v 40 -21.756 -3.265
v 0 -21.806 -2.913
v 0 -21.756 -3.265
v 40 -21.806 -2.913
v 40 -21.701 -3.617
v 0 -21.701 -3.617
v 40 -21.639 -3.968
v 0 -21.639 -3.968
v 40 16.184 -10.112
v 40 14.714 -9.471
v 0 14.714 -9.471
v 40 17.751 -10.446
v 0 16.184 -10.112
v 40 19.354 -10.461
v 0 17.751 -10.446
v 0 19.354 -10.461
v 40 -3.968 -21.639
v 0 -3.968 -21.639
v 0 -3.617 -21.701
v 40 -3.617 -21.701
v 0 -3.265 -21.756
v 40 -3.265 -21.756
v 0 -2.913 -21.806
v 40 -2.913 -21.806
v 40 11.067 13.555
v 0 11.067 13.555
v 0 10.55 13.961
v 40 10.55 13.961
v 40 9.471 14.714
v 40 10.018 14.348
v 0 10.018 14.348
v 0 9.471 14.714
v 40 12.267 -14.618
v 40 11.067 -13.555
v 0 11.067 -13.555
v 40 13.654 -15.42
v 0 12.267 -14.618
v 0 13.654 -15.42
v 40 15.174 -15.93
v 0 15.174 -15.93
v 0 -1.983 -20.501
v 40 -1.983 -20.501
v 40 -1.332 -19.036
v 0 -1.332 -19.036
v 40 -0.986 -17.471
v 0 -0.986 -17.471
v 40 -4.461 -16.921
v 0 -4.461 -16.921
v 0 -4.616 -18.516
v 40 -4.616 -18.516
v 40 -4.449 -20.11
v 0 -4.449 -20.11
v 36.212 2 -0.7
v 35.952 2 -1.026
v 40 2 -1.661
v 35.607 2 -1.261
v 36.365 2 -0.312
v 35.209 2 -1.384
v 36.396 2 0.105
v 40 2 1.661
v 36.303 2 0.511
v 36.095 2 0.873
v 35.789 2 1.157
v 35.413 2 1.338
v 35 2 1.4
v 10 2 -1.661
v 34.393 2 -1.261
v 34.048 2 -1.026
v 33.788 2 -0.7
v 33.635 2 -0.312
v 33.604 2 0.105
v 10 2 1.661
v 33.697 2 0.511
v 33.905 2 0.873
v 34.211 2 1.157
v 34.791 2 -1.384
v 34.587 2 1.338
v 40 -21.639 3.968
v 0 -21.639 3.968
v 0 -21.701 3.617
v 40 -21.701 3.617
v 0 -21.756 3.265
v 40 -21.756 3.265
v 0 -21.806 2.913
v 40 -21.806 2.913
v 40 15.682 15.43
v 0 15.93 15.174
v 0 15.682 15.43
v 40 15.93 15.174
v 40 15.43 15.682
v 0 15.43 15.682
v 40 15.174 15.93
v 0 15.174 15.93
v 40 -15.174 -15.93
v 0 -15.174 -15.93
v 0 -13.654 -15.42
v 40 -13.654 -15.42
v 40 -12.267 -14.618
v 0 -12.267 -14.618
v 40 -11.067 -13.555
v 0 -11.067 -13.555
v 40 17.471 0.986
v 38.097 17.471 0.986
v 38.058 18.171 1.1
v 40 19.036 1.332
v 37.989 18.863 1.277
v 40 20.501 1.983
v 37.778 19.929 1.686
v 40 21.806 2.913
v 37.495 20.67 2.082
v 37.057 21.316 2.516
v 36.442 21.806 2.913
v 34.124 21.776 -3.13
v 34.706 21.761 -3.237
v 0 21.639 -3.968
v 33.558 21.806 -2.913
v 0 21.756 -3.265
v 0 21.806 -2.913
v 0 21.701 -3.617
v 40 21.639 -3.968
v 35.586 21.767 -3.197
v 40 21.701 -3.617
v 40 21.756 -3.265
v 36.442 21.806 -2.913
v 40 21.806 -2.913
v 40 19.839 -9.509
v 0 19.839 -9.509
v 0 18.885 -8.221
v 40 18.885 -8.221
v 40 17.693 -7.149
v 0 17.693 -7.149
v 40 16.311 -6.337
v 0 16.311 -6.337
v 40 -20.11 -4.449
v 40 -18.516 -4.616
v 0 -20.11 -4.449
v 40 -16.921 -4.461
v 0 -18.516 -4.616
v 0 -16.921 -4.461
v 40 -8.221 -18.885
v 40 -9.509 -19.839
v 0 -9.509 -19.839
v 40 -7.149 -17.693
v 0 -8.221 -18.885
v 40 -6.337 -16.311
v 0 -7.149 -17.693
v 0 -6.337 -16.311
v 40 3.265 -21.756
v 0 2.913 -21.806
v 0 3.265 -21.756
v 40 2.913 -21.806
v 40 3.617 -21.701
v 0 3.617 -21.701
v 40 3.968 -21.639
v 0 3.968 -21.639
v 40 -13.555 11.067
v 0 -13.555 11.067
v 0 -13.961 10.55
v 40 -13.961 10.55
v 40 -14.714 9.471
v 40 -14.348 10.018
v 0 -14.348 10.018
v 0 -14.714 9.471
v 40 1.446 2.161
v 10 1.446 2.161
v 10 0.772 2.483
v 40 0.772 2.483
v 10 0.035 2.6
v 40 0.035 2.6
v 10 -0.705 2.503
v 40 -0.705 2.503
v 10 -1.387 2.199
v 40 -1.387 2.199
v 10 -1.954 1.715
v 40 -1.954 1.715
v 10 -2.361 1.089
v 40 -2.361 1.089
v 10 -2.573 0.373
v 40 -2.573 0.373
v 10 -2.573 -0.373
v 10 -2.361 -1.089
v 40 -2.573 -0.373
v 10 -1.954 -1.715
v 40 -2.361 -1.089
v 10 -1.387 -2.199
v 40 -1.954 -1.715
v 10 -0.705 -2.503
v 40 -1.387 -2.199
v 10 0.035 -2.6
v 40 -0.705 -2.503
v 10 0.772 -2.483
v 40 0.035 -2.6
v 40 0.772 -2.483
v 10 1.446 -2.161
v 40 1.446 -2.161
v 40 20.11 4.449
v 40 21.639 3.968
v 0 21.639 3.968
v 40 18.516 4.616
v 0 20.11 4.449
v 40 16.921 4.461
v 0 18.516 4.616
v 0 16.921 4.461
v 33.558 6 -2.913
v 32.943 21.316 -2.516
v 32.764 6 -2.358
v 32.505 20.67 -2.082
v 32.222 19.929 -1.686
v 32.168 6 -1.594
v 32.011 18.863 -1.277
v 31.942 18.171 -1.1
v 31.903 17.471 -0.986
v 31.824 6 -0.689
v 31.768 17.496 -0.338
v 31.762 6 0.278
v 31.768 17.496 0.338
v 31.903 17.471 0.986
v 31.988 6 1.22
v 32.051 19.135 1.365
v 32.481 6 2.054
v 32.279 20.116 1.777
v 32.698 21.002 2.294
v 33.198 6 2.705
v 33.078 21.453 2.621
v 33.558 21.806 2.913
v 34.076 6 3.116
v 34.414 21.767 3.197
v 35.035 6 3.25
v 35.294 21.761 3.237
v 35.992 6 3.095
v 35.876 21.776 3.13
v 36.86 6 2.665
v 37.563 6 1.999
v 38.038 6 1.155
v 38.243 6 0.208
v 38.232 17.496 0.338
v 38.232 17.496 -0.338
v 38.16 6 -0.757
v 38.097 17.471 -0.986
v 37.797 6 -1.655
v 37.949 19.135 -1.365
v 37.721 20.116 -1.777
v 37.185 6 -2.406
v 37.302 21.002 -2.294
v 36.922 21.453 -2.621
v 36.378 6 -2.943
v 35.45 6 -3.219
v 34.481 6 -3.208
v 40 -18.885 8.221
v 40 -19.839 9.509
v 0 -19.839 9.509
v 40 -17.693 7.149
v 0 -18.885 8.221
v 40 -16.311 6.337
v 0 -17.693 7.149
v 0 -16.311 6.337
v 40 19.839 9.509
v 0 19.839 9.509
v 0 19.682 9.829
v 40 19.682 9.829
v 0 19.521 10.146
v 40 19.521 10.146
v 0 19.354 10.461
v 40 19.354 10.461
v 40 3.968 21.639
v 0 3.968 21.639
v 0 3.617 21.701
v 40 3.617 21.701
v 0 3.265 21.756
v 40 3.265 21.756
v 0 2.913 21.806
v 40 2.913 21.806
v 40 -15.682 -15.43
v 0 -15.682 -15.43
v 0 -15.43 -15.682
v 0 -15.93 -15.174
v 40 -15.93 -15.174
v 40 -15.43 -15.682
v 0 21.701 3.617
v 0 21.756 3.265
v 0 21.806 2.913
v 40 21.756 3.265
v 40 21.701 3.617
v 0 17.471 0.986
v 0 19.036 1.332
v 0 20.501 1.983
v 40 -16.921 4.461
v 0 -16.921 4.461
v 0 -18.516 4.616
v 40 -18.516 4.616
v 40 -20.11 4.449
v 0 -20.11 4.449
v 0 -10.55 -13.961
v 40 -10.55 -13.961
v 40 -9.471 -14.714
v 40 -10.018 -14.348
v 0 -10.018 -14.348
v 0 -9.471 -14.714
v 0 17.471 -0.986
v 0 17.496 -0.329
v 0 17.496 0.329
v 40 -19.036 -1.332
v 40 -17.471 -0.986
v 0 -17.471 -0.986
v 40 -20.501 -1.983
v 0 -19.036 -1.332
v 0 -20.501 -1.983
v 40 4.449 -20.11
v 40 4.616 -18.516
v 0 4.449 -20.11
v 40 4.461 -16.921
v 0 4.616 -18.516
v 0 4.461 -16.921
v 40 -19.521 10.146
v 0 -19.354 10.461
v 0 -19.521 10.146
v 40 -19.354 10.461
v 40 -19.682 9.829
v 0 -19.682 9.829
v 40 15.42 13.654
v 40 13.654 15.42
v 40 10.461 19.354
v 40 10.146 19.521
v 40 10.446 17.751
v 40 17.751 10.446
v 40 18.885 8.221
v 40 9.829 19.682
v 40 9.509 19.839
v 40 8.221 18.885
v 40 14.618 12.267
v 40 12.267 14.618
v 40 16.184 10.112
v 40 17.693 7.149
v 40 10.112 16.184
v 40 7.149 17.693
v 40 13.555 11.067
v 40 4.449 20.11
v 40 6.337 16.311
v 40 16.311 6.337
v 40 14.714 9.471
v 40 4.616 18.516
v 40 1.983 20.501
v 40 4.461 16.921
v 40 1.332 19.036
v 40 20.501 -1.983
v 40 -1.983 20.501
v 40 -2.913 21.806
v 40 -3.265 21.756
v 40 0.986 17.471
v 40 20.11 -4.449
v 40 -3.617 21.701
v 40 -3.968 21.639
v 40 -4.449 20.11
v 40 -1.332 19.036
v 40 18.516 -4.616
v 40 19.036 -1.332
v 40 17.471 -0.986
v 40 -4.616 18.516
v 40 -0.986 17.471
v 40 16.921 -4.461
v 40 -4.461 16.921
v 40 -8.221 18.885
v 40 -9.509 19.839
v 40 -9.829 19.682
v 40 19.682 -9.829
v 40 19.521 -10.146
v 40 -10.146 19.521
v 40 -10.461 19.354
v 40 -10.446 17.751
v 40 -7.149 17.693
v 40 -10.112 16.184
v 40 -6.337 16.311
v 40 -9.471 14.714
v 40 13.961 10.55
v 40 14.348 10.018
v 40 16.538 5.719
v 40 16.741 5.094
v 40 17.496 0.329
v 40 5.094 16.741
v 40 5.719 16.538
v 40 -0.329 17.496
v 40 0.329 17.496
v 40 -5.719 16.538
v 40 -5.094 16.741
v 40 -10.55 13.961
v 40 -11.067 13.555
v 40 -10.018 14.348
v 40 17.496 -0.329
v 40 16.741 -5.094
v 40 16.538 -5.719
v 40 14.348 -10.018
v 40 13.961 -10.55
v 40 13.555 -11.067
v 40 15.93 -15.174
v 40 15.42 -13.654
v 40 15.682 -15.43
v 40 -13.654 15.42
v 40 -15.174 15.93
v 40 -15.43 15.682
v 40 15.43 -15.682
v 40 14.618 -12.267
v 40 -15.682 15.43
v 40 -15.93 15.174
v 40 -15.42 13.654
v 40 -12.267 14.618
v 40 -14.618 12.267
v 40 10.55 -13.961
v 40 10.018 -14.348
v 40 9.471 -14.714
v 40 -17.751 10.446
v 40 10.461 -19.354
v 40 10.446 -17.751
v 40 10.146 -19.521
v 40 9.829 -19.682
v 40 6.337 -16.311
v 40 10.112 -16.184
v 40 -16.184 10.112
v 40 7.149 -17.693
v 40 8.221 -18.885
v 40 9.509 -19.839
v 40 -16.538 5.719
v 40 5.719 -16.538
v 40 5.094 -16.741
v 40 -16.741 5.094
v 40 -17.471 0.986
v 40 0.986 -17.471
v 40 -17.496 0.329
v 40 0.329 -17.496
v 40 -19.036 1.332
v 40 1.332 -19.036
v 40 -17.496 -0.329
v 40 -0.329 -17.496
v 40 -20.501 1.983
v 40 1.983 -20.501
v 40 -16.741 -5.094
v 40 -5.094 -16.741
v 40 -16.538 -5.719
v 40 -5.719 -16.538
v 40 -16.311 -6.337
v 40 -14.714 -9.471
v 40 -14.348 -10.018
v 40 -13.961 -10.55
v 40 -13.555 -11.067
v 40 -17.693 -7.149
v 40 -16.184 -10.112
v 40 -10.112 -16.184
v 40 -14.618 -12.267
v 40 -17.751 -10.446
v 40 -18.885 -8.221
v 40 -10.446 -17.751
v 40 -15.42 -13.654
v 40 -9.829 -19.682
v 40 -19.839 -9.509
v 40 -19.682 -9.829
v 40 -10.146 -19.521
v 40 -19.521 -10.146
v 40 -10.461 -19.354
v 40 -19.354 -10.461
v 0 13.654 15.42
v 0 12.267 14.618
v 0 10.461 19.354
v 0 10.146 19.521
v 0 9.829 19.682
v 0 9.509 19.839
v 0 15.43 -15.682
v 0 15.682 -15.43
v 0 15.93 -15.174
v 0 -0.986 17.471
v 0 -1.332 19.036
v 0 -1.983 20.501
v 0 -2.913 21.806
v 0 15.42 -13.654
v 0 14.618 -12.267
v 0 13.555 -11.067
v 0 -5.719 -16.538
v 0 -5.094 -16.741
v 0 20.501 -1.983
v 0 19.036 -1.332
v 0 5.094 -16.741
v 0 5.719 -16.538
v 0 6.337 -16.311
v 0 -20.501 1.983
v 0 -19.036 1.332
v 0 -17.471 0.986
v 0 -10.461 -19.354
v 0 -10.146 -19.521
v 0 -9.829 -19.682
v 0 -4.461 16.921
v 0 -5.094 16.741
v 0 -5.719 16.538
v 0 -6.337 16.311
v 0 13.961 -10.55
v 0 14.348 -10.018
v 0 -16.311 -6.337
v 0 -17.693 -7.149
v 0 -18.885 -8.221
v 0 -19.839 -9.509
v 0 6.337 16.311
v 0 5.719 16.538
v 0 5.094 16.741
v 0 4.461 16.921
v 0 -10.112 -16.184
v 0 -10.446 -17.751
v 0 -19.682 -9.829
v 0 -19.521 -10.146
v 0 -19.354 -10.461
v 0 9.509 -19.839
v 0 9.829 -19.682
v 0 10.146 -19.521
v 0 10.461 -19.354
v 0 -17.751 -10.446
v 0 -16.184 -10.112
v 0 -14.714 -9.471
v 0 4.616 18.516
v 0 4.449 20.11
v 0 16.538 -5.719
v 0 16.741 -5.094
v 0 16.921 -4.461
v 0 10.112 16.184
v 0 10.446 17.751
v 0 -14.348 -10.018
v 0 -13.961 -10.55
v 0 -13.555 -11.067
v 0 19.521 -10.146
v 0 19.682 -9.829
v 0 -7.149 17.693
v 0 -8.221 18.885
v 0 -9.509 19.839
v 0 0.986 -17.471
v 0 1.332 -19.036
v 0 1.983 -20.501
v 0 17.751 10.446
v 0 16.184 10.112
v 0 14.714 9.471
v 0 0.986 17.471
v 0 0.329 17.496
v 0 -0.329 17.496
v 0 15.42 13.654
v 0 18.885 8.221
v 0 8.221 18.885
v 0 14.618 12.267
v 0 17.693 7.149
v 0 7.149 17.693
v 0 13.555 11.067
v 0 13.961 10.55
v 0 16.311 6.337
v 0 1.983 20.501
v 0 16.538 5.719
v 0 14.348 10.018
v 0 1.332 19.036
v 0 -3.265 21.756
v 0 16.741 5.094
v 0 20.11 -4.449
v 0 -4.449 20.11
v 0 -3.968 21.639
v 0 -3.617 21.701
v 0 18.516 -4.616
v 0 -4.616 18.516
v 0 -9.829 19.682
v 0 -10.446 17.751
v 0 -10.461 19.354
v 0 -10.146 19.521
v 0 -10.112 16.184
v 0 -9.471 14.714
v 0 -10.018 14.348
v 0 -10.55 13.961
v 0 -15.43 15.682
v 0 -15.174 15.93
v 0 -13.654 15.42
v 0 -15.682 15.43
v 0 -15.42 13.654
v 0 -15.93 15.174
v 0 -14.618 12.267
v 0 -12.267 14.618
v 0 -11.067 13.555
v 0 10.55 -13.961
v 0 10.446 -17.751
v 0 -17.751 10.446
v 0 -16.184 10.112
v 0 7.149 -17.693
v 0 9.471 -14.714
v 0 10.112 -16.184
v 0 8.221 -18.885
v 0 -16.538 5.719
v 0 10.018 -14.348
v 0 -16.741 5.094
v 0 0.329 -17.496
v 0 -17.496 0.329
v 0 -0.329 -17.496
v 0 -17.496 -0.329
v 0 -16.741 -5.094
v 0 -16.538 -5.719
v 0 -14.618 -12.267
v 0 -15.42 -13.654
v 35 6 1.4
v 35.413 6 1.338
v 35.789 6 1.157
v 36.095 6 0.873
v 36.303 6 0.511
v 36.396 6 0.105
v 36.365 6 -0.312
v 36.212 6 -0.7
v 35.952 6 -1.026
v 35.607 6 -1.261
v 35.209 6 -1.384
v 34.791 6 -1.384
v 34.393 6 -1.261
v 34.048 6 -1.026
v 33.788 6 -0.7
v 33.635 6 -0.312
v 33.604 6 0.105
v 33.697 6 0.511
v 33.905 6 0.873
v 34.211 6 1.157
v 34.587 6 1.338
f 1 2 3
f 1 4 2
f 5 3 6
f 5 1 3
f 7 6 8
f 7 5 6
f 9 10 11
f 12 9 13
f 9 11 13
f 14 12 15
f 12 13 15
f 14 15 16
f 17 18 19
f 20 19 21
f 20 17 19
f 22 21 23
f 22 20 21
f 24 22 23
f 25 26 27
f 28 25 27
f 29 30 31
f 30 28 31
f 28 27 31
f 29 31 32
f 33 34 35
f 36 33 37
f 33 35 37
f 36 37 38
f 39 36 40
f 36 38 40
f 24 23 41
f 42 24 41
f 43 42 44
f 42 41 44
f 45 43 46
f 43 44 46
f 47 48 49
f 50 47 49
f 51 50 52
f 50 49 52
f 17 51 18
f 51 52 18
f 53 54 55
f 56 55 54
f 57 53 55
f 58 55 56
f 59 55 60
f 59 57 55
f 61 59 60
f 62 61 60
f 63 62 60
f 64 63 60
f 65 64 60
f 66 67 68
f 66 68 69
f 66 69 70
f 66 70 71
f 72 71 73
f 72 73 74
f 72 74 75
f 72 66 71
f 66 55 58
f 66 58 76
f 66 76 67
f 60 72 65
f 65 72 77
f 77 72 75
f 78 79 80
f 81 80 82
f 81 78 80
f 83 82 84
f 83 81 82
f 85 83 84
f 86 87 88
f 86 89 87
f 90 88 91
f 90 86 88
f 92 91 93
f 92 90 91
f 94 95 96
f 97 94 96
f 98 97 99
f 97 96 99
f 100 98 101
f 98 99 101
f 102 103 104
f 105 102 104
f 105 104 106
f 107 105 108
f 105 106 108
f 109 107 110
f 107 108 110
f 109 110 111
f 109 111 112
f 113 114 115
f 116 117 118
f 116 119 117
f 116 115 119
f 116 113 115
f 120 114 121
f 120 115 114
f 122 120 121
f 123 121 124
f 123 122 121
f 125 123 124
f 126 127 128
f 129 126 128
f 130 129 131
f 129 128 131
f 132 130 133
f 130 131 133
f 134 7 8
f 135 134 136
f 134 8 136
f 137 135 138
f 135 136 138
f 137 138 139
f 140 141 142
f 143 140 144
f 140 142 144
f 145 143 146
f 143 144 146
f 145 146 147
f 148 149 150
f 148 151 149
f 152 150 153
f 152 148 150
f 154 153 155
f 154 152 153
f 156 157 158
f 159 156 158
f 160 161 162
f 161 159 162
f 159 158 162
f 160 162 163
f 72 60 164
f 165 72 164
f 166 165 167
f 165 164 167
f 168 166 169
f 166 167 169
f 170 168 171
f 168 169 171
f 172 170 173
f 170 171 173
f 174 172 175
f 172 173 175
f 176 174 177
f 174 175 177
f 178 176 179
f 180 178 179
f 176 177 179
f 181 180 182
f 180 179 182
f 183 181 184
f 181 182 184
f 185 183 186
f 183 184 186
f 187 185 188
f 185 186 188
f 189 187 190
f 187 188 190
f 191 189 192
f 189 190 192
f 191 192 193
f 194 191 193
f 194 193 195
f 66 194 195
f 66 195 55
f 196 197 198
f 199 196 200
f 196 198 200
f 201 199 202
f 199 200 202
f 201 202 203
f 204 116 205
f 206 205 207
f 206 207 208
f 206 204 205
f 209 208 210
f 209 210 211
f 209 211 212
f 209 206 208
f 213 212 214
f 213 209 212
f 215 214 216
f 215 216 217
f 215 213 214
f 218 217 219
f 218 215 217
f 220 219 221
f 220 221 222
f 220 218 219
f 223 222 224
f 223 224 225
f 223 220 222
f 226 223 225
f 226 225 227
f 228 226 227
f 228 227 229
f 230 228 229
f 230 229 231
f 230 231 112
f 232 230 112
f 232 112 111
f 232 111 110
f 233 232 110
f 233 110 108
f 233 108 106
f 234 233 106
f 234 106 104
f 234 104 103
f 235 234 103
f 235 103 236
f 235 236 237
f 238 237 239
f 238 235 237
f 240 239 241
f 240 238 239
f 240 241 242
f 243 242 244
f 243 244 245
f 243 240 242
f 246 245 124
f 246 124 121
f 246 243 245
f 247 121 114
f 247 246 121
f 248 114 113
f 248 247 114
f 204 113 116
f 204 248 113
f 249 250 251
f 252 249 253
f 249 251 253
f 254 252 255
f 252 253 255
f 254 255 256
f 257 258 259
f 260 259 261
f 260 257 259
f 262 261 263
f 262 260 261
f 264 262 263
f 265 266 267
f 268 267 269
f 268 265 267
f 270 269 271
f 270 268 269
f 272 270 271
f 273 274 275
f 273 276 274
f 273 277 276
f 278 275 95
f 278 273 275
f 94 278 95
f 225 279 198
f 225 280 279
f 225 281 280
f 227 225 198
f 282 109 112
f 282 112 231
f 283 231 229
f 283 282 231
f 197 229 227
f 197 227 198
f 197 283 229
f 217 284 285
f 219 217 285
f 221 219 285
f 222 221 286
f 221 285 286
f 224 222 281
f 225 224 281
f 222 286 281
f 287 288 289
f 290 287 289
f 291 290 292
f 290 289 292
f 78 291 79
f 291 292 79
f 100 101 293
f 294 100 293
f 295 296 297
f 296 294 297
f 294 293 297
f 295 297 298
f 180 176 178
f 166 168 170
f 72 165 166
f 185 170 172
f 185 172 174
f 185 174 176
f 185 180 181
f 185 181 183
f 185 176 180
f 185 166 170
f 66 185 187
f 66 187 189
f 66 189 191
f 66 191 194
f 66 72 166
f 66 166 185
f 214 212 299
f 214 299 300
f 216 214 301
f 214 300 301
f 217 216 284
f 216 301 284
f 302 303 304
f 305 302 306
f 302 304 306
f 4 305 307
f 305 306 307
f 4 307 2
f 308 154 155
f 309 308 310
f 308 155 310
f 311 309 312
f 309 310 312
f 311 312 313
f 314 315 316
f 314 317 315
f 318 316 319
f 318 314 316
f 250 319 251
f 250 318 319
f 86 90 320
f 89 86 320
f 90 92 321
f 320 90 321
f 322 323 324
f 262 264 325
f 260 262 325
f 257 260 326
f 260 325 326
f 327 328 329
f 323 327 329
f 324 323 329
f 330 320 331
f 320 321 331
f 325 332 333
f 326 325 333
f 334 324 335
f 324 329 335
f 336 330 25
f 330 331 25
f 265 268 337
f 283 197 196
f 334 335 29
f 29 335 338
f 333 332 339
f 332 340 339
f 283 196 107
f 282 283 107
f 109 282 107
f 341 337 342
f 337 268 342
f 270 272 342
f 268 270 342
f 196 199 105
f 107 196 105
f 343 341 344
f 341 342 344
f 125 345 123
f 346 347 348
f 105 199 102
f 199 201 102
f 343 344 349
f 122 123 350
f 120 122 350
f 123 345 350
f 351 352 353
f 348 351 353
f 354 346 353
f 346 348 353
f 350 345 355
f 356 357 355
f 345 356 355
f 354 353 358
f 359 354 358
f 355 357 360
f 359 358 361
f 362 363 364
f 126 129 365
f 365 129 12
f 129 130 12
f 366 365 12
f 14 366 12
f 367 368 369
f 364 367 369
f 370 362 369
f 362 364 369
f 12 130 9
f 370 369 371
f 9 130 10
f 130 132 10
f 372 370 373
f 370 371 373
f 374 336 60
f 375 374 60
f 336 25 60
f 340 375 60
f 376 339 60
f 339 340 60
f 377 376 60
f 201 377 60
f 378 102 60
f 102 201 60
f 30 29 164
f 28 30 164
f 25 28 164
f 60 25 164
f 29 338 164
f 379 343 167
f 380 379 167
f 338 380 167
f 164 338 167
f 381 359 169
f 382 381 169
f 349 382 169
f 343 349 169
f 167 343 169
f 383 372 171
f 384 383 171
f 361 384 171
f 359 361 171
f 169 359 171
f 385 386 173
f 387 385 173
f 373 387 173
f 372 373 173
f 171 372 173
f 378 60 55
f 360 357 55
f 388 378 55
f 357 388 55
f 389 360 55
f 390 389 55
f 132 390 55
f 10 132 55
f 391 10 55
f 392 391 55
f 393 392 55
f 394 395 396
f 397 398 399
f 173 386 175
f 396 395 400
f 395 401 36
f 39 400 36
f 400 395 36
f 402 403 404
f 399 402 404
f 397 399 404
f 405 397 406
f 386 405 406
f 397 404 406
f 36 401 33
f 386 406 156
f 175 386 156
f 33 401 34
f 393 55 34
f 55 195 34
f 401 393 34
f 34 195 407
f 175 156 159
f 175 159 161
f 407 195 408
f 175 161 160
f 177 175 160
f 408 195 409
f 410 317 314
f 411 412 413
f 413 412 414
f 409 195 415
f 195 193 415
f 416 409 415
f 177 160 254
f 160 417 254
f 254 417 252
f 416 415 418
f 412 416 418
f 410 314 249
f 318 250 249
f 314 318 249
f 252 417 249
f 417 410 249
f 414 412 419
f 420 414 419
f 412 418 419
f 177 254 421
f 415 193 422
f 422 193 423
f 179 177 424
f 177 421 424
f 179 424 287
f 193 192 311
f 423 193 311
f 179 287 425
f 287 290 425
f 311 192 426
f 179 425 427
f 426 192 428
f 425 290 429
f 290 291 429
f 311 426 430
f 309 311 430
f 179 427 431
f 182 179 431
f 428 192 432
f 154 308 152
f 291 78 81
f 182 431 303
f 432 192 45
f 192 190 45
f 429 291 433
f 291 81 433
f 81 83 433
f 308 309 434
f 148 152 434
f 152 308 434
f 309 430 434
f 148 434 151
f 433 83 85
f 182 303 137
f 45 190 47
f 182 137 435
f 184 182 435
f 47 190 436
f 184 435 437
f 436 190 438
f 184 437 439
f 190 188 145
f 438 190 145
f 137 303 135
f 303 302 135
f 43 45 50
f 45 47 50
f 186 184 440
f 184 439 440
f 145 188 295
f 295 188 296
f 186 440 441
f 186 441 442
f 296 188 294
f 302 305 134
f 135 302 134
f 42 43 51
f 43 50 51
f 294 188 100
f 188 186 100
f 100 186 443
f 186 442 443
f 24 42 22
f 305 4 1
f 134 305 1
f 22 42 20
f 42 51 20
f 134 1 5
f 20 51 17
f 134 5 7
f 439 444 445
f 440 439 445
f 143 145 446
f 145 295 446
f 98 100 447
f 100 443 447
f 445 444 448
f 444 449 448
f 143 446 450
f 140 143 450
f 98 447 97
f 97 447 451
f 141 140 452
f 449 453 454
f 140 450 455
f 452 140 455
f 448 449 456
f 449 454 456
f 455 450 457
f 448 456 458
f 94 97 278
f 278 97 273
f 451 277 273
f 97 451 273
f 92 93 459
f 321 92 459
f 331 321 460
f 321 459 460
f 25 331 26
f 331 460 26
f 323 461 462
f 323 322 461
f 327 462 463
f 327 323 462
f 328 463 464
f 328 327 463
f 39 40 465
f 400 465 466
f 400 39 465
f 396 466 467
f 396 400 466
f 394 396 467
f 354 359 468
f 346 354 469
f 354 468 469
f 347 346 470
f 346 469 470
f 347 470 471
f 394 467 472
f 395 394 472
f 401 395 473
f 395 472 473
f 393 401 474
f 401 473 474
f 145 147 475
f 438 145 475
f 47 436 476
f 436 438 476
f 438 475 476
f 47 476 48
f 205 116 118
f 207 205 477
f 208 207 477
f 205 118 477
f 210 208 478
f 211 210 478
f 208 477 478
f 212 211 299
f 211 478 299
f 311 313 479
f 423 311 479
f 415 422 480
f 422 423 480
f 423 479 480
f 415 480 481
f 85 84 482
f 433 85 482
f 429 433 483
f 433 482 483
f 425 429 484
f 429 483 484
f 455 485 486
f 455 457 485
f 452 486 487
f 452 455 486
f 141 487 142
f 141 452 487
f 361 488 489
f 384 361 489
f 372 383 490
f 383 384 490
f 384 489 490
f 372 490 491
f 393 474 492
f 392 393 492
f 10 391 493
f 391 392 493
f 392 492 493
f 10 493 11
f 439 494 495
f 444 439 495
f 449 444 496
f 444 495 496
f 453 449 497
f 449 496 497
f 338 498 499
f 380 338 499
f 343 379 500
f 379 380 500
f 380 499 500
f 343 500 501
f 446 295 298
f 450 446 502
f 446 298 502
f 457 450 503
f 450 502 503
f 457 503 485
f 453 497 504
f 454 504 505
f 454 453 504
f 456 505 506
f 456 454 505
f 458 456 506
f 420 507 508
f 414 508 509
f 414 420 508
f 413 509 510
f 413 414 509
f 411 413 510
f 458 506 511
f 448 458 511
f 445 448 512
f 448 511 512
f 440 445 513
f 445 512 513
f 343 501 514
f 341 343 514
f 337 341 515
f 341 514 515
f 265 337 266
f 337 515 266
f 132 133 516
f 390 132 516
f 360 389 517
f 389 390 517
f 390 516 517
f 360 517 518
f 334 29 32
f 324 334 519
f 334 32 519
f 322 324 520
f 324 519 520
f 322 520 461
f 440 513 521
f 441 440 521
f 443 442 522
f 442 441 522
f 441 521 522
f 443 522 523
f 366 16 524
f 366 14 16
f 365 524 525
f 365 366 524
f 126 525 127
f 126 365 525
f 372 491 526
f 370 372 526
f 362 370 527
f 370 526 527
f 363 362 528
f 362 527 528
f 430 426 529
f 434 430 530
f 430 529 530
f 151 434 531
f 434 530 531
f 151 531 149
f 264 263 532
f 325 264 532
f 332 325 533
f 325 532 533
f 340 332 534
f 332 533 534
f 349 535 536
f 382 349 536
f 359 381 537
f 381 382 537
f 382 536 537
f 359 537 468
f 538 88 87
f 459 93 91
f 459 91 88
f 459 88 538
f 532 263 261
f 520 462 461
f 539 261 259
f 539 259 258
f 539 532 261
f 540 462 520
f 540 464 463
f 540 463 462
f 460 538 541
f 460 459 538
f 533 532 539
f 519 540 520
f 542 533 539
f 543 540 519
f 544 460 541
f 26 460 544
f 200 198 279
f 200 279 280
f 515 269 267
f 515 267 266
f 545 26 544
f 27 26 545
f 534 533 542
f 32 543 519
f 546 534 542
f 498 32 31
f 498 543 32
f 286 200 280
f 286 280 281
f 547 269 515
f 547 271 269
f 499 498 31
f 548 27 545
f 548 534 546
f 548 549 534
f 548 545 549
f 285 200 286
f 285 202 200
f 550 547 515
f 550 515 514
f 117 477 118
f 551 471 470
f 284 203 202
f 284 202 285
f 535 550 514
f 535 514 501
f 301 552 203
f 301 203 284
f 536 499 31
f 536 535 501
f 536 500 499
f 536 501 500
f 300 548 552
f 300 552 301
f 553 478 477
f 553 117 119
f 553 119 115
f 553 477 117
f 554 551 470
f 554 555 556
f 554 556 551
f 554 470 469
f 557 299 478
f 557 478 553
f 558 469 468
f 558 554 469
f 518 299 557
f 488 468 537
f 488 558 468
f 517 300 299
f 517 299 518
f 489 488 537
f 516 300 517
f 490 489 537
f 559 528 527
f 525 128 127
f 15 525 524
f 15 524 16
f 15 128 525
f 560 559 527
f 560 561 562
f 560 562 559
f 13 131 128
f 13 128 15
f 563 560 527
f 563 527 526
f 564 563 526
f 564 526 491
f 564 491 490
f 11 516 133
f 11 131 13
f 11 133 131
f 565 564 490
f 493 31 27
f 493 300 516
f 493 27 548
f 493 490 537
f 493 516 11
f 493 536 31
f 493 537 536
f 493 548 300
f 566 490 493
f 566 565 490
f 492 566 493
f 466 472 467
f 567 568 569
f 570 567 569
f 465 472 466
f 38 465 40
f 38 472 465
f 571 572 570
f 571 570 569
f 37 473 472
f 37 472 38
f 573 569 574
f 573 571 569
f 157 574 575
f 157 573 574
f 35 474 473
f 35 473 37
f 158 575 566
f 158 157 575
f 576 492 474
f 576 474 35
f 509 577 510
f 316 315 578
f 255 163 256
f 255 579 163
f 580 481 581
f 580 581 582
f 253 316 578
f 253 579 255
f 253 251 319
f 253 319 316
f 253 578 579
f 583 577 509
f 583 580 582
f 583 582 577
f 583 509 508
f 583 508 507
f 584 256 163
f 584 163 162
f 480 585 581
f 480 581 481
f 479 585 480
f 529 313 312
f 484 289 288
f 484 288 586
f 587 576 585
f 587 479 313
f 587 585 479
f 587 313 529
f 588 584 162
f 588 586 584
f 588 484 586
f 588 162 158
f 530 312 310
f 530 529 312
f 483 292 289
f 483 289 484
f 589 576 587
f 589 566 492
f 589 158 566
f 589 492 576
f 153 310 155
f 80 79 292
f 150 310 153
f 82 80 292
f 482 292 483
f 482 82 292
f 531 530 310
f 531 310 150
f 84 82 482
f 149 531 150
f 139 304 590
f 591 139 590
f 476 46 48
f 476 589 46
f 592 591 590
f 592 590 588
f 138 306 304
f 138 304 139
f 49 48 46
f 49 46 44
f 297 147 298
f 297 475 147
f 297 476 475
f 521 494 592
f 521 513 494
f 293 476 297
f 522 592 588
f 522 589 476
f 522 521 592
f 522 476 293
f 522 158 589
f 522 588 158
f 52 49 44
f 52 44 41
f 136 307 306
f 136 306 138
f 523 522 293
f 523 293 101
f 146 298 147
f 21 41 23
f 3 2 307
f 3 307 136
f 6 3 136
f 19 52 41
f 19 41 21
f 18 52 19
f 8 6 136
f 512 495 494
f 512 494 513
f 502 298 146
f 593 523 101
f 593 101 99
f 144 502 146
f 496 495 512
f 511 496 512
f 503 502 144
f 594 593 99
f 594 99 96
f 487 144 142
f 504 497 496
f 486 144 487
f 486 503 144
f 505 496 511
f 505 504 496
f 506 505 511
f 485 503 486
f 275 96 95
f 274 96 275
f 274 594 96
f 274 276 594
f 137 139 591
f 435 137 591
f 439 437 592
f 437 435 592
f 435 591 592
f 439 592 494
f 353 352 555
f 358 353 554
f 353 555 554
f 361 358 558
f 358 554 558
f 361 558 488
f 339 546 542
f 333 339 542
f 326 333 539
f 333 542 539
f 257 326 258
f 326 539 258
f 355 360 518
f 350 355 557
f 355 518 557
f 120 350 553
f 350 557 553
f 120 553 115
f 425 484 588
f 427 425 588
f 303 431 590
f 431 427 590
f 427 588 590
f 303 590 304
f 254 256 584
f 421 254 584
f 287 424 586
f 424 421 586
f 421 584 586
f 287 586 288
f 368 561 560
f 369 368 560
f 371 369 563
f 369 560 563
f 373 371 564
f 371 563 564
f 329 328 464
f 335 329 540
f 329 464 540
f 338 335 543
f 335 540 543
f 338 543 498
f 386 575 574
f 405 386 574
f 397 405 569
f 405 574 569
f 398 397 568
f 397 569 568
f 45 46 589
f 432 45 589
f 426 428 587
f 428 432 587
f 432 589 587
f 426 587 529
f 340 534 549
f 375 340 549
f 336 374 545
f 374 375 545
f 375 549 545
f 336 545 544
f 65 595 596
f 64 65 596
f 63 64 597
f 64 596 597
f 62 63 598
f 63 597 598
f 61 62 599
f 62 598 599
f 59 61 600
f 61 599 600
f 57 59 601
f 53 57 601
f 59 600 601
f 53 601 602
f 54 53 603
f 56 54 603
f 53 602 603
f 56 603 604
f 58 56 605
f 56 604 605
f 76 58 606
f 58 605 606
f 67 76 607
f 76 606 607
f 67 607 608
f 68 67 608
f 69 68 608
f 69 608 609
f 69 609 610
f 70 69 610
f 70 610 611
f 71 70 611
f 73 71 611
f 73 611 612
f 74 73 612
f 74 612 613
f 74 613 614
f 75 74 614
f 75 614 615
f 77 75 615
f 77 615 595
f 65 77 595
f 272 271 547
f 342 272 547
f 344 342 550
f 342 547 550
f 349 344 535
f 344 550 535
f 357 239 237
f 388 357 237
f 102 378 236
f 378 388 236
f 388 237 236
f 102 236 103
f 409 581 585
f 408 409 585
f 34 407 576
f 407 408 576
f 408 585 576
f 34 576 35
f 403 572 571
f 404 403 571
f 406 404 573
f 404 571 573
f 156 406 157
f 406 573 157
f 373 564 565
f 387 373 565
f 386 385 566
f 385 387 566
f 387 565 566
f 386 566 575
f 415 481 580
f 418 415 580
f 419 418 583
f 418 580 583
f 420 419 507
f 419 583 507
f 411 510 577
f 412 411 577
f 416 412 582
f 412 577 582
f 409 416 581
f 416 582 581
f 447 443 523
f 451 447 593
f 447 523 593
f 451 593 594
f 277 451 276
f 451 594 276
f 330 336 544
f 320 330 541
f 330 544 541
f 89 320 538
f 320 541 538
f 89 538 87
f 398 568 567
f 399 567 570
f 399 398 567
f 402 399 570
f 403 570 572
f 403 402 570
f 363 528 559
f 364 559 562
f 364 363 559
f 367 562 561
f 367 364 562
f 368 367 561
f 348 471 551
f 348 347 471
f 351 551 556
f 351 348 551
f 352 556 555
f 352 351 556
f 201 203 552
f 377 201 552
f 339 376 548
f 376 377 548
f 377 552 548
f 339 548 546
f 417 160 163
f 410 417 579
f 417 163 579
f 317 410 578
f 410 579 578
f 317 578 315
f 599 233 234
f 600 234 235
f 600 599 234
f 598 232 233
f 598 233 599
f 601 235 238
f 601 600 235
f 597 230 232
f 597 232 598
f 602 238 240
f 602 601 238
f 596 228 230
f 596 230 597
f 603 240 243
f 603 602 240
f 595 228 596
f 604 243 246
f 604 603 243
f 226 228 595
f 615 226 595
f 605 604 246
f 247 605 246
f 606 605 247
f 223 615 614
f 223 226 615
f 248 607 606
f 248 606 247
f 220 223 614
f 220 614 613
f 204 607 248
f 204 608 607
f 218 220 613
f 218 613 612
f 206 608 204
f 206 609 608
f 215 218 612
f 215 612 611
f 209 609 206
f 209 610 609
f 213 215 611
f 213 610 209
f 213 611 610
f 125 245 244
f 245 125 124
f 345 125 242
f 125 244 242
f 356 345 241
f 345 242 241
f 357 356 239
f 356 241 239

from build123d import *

# Parameters (mm, degrees)
BASPROSKE_W         = 40
BASPROSKE_H         = 22
TOOTHCUT_DEPTH      = 51.675437837
TEETHCUTS_COUNT     = 20
TEETHCUTS_ANGLE     = 342
BORSKE_R            = 0.4
BORE_DEPTH          = 50.0000508
SKETCH1_R           = 2.6
CUT_EXTRUDE1_DEPTH  = 51.50774594
BOSS_EXTRUDE1_DEPTH = 40
BOSS_EXTRUDE2_START = -10
BOSS_EXTRUDE2_DEPTH = 10
SKETCH4_R           = 3.25
CUT_EXTRUDE2_DEPTH  = 54.373293014
CUT_EXTRUDE3_REACH  = 55.373
SKETCH5_R           = 1.4


with BuildPart() as part:
    # BasProSke → Base-Revolve (revolve)
    with BuildSketch(Plane(origin=(0, 0, 0), x_dir=(1, 0, 0), z_dir=(0, 1, 0)), mode=Mode.PRIVATE) as base_revolve_sk:
        with Locations((20, 11)):
            Rectangle(BASPROSKE_W, BASPROSKE_H)
    revolve(base_revolve_sk.sketch.rotate(Axis((-10, 0, 0), (1, 0, 0)), 180), axis=Axis((-10, 0, 0), (1, 0, 0)))

    # TooCutSke → ToothCut (cut, through all)
    with BuildSketch(Plane(origin=(0, 0, 0), x_dir=(0, 0, -1), z_dir=(1, 0, 0))):
        with BuildLine():
            ThreePointArc((0.986171591, 17.471189616), (0, 17.499), (-0.986171591, 17.471189616))
            ThreePointArc((-0.986171591, 17.471189616), (-1.626916196, 19.798789858), (-2.932850173, 21.829260982))
            ThreePointArc((-2.932850173, 21.829260982), (0, 22.0254), (2.932850173, 21.829260982))
            ThreePointArc((2.932850173, 21.829260982), (1.626916196, 19.798789858), (0.986171591, 17.471189616))
        make_face()
    toothcut = extrude(amount=TOOTHCUT_DEPTH, mode=Mode.SUBTRACT)

    # TeethCuts: ToothCut ×20 about axis
    teethcuts_axis = Axis((-10, 0, 0), (1, 0, 0))
    for i in range(1, TEETHCUTS_COUNT):
        add(toothcut.rotate(teethcuts_axis, i * TEETHCUTS_ANGLE / (TEETHCUTS_COUNT - 1)), mode=Mode.SUBTRACT)

    # BorSke → Bore (cut, symmetric)
    with BuildSketch(Plane(origin=(0, 0, 0), x_dir=(0, 0, -1), z_dir=(1, 0, 0))):
        with Locations(Location((0, 0, 0), (0, 0, 180))):
            Circle(BORSKE_R)
    extrude(amount=BORE_DEPTH, both=True, mode=Mode.SUBTRACT)

    # Sketch1 → Cut-Extrude1 (cut, through all)
    with BuildSketch(Plane(origin=(40, 0, 0), x_dir=(0, 0, -1), z_dir=(1, 0, 0))):
        Circle(SKETCH1_R)
    extrude(amount=-CUT_EXTRUDE1_DEPTH, mode=Mode.SUBTRACT)

    # Sketch2 → Boss-Extrude1 (add)
    with BuildSketch(Plane.ZY):
        with BuildLine():
            Line((-2.236067977, 2), (2.236067977, 2))
            ThreePointArc((2.236067977, 2), (0, 3), (-2.236067977, 2))
        make_face()
    extrude(amount=-BOSS_EXTRUDE1_DEPTH)

    # Sketch3 → Boss-Extrude2 (add)
    with BuildSketch(Plane.ZY.offset(BOSS_EXTRUDE2_START)):
        with BuildLine():
            Line((-1.661324773, 2), (1.661324773, 2))
            ThreePointArc((1.661324773, 2), (0, -2.6), (-1.661324773, 2))
        make_face()
    extrude(amount=BOSS_EXTRUDE2_DEPTH)

    # Sketch4 → Cut-Extrude2 (cut, through all)
    with BuildSketch(Plane(origin=(0, 6, 0), x_dir=(1, 0, 0), z_dir=(0, 1, 0))):
        with Locations(Location((35, 0, 0), (0, 0, 116.335173549))):
            Circle(SKETCH4_R)
    extrude(amount=CUT_EXTRUDE2_DEPTH, mode=Mode.SUBTRACT)

    # Sketch5 → Cut-Extrude3 (cut, up to next)
    with BuildSketch(Plane(origin=(0, 6, 0), x_dir=(1, 0, 0), z_dir=(0, 1, 0)), mode=Mode.PRIVATE) as cut_extrude3_sk1:
        with Locations(Location((35, 0, 0), (0, 0, 270))):
            Circle(SKETCH5_R)
    cut_extrude3_tool1 = extrude(cut_extrude3_sk1.sketch, amount=-CUT_EXTRUDE3_REACH, mode=Mode.PRIVATE) & part.part
    add(cut_extrude3_tool1.solids().sort_by_distance((35, 6, 0))[0], mode=Mode.SUBTRACT)


solid = part.part
